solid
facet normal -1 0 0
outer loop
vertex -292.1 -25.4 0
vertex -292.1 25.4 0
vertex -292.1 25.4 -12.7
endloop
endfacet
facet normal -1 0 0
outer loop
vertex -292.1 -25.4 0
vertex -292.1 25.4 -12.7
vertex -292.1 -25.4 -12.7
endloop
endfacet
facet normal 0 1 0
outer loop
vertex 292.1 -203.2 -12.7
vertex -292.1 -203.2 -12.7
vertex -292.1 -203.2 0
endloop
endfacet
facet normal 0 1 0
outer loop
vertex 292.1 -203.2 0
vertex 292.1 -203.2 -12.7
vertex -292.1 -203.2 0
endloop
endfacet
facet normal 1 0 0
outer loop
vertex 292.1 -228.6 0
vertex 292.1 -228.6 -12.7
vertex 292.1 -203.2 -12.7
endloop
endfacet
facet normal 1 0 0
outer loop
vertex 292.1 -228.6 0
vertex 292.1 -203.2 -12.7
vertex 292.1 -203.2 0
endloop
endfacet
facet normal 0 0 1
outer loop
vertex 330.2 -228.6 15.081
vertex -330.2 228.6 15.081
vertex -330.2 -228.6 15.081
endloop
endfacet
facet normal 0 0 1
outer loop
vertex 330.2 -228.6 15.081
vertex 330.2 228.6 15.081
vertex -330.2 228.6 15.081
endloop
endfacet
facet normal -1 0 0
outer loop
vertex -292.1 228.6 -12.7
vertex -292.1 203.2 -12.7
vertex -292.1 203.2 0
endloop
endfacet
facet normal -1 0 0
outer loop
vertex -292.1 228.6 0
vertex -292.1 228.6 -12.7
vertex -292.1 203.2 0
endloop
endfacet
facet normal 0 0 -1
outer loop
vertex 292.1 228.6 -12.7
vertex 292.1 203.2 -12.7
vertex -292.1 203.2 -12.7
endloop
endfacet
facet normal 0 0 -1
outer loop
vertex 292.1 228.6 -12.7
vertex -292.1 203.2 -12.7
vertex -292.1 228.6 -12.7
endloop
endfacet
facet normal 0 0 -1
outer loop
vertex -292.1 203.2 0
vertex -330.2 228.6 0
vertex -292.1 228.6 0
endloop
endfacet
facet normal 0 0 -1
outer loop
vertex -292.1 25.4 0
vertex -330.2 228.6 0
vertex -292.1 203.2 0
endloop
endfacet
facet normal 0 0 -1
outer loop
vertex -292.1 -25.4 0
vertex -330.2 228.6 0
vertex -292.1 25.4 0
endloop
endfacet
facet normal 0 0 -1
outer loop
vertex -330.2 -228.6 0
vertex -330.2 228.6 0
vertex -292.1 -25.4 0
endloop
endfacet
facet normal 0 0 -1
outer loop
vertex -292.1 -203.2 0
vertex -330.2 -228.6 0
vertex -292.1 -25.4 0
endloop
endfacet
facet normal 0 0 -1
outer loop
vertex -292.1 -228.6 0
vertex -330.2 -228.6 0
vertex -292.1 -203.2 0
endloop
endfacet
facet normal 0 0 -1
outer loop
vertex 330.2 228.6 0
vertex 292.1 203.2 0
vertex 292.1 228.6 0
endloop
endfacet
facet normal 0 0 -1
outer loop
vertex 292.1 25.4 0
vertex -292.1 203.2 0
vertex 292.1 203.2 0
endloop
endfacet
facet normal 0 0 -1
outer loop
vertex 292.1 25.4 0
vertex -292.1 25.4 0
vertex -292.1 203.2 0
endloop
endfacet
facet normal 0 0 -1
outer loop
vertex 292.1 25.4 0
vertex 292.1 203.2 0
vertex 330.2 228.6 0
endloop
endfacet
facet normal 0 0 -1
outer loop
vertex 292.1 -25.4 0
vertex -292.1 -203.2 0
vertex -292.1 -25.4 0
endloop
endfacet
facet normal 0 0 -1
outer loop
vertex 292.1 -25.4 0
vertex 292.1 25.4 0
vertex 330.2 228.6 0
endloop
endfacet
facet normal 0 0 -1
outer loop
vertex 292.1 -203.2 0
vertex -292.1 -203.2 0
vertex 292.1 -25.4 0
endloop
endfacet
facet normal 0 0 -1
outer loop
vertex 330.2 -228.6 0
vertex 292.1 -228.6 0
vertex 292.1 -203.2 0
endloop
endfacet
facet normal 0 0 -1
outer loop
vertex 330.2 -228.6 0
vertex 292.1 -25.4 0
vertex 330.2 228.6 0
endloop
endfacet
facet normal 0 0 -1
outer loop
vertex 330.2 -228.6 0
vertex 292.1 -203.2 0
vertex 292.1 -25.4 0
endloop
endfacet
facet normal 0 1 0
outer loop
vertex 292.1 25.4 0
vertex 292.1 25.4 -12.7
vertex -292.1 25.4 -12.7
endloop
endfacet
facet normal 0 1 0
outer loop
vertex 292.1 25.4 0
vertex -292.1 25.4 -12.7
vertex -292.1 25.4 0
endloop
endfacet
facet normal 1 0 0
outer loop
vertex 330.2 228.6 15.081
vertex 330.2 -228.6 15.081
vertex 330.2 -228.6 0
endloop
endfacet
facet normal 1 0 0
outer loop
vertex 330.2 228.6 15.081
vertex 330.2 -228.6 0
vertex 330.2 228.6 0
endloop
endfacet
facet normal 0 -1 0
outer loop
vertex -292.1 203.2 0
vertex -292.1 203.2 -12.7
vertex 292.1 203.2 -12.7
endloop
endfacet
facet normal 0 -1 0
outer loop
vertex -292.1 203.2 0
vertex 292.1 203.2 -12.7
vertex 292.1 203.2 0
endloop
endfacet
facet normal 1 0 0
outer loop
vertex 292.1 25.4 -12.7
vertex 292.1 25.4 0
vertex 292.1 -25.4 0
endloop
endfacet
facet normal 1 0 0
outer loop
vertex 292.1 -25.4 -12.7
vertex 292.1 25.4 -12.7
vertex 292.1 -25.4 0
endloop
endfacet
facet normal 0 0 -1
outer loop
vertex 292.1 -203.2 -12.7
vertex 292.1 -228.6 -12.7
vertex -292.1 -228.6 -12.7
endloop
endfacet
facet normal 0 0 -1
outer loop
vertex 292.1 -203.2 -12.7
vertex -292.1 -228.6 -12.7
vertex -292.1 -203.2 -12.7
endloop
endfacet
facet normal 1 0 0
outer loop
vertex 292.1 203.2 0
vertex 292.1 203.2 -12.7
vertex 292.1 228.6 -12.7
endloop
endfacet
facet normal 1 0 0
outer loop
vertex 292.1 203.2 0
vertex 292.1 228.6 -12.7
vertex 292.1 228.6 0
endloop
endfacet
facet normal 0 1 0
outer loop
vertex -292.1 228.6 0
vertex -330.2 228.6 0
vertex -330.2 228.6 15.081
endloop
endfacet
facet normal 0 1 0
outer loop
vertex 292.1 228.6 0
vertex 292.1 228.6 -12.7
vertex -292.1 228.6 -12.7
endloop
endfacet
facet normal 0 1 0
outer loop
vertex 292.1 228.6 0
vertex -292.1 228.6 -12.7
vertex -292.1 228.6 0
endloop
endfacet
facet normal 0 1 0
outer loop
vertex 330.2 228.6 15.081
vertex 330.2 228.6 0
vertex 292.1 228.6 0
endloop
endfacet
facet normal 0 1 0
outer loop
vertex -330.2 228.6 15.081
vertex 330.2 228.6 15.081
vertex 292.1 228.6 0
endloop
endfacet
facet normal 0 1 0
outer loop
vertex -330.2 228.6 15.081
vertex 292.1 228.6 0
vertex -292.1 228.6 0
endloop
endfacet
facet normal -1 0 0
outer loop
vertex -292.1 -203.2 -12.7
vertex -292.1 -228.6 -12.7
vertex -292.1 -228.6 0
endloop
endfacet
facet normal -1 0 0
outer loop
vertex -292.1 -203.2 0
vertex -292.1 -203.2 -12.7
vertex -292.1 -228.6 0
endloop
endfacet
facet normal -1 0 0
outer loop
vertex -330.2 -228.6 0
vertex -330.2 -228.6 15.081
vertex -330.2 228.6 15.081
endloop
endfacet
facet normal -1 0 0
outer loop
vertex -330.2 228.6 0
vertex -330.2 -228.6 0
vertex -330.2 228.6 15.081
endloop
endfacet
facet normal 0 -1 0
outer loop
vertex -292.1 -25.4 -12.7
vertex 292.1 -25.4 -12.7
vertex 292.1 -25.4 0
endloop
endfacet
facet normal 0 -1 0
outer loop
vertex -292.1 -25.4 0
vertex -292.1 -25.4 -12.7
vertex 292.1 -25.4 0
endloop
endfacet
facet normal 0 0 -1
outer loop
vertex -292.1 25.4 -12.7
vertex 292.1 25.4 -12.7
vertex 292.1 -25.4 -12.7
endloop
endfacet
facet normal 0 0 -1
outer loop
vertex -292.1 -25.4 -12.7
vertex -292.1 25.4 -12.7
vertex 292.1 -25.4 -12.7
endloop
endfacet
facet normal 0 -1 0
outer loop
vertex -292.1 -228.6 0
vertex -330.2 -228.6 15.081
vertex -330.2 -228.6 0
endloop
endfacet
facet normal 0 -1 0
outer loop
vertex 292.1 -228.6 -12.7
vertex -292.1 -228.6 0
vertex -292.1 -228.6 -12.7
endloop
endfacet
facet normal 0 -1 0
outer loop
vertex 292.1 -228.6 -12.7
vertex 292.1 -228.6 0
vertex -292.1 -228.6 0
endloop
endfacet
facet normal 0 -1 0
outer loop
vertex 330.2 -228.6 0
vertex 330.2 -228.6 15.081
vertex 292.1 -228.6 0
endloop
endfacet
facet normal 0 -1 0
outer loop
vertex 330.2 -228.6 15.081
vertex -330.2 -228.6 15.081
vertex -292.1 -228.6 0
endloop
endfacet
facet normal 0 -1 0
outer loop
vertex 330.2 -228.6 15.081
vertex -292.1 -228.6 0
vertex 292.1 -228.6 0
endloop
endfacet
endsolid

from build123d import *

# Parameters (mm, degrees)
F0_W     = 25.4
F0_H     = 12.7
F1_DEPTH = 330.2
F2_W     = 38.1
F2_H     = 12.7
F3_DEPTH = 457.201
F4_W     = 50.8
F4_H     = 12.7
F5_DEPTH = 584.2


with BuildPart() as f1:
    # F0 (on Right) → F1 (new body, symmetric)
    with BuildSketch(Plane.YZ):
        with Locations((-215.9, -6.35)):
            Rectangle(F0_W, F0_H)
        Polygon((-228.6, 15.08125), (-228.6, 0), (-203.2, 0), (203.2, 0), (228.6, 0), (228.6, 15.08125), align=None)
        with Locations((215.9, -6.35)):
            Rectangle(F0_W, F0_H)
    extrude(amount=F1_DEPTH, both=True)

    # F2 (on face) → F3 (cut, through all)
    with BuildSketch(Plane.XZ.offset(228.6)):
        with Locations((-311.15, -6.35)):
            Rectangle(F2_W, F2_H)
        with Locations((311.15, -6.35)):
            Rectangle(F2_W, F2_H)
    extrude(amount=-F3_DEPTH, mode=Mode.SUBTRACT)

    # F4 (on face) → F5 (join, through all)
    with BuildSketch(Plane(origin=(-292.1, 0, 0), x_dir=(0, -1, 0), z_dir=(-1, 0, 0))):
        with Locations((0, -6.35)):
            Rectangle(F4_W, F4_H)
    extrude(amount=-F5_DEPTH)


solid = f1.part
